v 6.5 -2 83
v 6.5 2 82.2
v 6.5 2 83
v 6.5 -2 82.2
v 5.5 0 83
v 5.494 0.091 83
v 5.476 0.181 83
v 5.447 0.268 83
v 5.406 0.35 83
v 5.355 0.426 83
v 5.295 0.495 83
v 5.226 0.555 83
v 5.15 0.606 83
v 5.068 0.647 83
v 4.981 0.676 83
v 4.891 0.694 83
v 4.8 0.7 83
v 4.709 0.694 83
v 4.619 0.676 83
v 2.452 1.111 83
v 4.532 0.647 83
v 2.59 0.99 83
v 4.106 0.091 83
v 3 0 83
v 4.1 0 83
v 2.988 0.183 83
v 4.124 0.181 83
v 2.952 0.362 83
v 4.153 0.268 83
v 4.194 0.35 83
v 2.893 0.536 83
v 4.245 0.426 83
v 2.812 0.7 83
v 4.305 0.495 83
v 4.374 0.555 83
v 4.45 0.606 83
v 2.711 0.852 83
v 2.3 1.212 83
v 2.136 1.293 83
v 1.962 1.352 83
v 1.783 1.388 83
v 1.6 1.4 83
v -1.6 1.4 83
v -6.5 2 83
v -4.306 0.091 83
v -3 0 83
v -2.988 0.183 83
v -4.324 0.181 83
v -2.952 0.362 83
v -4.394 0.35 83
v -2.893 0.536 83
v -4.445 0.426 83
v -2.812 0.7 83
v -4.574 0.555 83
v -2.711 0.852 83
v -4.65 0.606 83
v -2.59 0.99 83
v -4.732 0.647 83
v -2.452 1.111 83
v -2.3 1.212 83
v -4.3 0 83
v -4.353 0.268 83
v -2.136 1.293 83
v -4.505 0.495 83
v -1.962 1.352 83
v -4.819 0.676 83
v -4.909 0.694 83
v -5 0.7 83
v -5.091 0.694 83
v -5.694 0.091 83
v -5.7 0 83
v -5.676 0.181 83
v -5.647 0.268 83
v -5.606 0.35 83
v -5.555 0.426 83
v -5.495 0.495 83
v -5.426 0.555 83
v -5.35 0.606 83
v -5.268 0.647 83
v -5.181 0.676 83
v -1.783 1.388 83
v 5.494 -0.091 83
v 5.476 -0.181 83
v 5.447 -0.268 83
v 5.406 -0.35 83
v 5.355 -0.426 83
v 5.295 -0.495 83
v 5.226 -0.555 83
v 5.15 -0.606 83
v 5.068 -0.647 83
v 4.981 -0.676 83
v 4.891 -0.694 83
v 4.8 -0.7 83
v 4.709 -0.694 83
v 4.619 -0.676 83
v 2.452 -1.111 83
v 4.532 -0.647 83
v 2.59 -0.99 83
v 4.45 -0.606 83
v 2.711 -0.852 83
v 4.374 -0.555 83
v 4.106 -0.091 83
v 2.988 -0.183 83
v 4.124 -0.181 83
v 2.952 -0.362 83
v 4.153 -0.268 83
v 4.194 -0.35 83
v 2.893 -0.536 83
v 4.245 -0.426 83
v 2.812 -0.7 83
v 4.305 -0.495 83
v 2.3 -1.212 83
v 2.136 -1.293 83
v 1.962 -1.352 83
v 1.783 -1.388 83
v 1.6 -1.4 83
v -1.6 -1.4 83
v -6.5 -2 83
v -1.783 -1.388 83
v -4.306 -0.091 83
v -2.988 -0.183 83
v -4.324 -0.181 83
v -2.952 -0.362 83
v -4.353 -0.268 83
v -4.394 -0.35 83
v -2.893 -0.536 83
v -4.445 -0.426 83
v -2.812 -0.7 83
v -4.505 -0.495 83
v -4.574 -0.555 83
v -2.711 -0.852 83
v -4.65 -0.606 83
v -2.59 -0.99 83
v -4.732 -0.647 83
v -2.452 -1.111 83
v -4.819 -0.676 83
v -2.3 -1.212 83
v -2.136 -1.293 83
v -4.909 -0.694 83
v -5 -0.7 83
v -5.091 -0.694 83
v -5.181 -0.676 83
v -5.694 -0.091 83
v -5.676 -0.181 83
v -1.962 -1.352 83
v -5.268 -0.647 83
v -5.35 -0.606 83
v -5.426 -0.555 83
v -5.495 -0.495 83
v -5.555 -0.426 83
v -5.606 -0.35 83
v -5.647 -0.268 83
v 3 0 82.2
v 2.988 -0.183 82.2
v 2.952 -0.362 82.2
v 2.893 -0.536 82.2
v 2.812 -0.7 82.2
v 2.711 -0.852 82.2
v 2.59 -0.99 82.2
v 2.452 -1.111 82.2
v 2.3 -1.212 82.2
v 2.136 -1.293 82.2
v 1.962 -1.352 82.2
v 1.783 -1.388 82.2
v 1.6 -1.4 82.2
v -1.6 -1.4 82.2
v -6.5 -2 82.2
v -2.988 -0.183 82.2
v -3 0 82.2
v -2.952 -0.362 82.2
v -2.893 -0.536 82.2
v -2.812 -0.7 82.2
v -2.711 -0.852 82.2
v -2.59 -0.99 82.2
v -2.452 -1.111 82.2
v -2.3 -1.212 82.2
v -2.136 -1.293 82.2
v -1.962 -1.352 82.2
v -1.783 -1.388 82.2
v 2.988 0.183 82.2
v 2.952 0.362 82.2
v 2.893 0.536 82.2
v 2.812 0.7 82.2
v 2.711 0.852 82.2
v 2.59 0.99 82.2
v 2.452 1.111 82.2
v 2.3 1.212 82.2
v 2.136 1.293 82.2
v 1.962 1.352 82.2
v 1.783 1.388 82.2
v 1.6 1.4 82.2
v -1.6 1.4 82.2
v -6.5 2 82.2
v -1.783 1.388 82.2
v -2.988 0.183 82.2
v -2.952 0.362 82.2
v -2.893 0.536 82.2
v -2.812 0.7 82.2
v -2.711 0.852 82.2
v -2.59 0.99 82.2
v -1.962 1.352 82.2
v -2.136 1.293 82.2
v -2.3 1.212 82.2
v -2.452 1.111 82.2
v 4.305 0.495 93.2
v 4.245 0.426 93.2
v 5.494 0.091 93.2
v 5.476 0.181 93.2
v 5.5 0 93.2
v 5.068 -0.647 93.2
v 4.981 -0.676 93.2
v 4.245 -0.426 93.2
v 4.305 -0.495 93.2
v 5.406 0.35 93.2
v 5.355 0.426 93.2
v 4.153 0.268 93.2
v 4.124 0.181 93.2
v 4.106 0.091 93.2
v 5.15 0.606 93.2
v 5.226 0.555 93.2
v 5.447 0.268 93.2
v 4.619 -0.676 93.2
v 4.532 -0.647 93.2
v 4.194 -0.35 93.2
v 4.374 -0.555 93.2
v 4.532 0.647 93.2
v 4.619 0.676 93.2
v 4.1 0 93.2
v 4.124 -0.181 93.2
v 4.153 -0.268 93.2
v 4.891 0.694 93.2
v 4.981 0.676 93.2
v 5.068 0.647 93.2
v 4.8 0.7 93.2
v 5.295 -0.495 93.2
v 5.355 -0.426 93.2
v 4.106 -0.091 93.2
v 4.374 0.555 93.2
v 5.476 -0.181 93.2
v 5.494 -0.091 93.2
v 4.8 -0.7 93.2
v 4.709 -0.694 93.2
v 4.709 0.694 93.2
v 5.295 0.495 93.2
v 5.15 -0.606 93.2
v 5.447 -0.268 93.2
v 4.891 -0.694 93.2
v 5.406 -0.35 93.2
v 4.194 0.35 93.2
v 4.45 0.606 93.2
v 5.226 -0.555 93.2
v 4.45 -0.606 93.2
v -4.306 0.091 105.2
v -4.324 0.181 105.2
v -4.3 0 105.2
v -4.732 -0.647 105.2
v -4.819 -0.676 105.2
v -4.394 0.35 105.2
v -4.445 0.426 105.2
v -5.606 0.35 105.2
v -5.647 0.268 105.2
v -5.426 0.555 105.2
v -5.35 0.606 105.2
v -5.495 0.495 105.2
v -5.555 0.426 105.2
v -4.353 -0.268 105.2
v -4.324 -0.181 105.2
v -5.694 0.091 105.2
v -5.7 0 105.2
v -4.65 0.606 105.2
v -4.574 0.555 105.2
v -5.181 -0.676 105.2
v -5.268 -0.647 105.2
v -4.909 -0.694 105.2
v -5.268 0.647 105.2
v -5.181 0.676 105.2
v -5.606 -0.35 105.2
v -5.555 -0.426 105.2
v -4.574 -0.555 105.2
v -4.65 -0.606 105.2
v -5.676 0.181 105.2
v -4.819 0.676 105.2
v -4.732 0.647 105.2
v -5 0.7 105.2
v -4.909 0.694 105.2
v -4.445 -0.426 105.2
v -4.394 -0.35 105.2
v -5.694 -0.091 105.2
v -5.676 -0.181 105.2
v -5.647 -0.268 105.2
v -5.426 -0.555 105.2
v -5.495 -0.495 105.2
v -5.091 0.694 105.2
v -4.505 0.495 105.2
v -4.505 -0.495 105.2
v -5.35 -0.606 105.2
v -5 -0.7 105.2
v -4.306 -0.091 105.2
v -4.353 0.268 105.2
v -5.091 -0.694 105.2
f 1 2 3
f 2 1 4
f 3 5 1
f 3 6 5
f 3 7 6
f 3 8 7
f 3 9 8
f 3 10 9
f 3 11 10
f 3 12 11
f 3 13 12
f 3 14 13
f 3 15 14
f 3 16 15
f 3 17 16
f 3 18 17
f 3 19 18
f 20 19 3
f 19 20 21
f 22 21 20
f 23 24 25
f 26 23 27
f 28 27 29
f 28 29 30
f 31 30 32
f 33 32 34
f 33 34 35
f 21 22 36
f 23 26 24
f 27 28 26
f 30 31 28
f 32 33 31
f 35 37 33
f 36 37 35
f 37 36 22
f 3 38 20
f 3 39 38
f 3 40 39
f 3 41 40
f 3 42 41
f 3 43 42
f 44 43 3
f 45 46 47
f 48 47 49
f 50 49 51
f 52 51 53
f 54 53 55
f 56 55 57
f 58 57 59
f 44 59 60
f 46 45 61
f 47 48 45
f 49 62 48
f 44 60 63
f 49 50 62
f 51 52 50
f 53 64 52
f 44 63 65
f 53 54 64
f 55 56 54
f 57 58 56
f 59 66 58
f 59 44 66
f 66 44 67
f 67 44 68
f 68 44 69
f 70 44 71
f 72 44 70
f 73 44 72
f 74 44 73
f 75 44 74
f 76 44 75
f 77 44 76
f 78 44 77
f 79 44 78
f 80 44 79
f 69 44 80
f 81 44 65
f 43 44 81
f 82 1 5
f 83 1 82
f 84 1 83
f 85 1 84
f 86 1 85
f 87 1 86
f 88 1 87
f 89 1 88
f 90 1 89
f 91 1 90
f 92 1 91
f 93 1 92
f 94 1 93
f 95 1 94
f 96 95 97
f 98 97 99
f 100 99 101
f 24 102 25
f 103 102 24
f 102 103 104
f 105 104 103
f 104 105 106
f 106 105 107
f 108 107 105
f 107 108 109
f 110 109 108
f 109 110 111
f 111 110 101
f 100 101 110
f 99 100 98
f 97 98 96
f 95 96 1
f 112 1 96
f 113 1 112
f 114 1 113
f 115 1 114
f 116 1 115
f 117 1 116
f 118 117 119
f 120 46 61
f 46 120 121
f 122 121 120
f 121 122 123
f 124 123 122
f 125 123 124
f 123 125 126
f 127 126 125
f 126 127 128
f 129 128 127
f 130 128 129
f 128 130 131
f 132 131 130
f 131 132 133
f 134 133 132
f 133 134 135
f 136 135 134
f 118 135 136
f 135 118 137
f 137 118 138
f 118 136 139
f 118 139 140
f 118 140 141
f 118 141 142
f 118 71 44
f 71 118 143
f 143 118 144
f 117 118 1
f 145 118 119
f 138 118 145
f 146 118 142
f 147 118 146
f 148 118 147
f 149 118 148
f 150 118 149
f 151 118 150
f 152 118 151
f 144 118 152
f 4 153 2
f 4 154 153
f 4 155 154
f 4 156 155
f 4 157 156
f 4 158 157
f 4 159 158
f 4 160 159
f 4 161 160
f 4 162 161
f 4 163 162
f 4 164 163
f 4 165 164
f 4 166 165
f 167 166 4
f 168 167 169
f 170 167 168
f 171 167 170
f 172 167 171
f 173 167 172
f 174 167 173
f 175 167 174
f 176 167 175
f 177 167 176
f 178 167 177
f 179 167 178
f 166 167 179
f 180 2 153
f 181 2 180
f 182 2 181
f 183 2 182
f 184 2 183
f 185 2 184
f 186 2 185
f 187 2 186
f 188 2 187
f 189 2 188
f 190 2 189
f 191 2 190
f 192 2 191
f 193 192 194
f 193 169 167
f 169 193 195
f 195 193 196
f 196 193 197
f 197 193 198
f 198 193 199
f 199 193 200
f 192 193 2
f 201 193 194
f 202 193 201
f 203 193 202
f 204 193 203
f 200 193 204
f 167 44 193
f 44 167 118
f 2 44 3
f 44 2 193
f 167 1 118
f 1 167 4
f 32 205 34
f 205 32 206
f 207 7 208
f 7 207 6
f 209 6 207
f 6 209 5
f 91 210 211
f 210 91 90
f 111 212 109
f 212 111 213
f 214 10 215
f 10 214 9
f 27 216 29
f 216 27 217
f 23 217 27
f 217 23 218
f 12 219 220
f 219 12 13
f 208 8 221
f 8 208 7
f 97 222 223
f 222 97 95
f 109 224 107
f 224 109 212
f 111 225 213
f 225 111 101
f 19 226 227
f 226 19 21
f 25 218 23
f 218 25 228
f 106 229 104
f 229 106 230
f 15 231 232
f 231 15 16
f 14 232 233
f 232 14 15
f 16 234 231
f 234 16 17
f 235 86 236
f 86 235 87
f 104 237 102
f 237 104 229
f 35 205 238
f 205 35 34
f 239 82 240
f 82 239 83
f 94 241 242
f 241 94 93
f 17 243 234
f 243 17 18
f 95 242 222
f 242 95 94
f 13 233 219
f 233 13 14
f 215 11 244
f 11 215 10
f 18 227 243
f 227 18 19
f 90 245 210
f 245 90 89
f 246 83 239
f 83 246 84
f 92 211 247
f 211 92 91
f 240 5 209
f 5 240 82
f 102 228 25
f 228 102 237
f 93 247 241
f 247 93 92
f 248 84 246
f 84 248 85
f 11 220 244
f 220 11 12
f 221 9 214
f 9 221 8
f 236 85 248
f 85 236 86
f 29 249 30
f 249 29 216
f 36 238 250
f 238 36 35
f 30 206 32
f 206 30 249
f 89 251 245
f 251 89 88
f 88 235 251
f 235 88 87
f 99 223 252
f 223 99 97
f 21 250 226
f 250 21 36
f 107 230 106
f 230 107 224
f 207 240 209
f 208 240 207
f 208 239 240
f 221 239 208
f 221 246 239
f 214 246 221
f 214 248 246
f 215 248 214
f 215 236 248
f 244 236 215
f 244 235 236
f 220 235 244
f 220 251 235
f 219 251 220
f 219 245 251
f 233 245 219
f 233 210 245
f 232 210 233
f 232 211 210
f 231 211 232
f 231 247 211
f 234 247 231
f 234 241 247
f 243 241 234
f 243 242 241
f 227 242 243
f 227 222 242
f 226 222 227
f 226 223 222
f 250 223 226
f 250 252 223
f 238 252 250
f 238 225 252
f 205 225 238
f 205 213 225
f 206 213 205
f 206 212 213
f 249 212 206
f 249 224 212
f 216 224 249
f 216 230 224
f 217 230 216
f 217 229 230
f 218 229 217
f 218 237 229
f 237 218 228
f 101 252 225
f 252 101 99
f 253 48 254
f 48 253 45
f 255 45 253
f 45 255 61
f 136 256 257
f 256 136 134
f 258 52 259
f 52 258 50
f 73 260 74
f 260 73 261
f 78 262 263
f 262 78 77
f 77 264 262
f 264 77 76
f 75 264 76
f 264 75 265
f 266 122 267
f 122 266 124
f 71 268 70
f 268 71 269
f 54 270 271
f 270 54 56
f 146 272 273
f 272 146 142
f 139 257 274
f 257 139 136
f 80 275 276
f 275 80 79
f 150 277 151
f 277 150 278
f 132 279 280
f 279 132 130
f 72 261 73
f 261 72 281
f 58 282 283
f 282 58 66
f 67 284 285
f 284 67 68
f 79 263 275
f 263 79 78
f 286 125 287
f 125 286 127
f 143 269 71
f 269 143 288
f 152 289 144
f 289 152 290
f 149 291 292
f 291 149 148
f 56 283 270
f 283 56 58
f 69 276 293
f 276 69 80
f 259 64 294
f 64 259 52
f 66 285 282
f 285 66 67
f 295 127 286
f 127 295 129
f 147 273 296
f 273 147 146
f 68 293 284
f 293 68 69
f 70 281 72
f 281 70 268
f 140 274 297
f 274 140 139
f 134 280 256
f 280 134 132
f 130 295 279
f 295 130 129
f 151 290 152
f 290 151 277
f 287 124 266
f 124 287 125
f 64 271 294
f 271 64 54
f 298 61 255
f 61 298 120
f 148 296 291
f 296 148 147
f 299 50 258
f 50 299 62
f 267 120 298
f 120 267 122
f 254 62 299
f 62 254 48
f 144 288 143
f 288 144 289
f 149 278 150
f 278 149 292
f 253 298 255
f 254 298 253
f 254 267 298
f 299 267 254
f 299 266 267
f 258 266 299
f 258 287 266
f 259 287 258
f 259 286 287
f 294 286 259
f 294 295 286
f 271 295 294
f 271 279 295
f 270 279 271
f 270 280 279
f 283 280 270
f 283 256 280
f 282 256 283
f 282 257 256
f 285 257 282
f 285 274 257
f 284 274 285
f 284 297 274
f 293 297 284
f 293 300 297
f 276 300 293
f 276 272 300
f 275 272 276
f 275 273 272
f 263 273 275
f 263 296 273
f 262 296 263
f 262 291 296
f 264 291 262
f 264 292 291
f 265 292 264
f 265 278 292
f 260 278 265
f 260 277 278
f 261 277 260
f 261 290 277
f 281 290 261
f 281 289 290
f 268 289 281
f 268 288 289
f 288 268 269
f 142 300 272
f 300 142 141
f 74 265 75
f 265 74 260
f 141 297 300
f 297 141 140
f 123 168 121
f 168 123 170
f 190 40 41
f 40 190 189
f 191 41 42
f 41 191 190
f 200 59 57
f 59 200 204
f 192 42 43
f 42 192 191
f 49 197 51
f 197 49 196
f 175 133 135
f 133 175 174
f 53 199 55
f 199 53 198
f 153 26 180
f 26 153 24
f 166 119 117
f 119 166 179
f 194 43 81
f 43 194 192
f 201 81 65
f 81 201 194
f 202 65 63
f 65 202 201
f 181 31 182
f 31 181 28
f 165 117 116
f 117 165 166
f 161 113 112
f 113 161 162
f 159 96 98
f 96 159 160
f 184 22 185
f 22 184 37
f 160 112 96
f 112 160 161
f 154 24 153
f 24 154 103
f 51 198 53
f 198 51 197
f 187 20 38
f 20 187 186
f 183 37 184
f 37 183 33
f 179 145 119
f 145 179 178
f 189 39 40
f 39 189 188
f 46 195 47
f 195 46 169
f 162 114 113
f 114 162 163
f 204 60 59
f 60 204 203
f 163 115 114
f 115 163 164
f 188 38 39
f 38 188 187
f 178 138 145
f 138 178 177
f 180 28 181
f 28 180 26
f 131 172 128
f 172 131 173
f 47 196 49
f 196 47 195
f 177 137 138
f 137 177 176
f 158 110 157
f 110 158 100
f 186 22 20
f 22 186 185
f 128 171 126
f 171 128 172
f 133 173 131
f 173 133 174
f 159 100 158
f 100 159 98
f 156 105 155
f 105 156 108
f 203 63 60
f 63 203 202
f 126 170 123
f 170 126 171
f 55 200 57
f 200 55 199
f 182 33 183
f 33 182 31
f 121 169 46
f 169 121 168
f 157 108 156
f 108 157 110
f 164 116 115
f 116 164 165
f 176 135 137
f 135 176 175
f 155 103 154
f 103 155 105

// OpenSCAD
$fn = 48;
// Leaf-spring v2: 4 mm wide beam with a central refill clearance slot.
difference() {
    union() {
        translate([-6.5,-2.0,82.2]) cube([13.0,4.0,0.8], center=false);
        translate([-6.5,-2.0,82.2]) cube([1.0,4.0,0.8], center=false);
        translate([ 5.5,-2.0,82.2]) cube([1.0,4.0,0.8], center=false);
        translate([ 4.8,0,83.0]) cylinder(h=10.2, r=0.70, center=false);
        translate([-5.0,0,83.0]) cylinder(h=22.2, r=0.70, center=false);
    }
    // central slot for the two refills (x=+/-1.6, Ø2.4)
    hull() {
        translate([-1.6,0,82.1]) cylinder(h=1.0, r=1.40, center=false);
        translate([ 1.6,0,82.1]) cylinder(h=1.0, r=1.40, center=false);
    }
}
